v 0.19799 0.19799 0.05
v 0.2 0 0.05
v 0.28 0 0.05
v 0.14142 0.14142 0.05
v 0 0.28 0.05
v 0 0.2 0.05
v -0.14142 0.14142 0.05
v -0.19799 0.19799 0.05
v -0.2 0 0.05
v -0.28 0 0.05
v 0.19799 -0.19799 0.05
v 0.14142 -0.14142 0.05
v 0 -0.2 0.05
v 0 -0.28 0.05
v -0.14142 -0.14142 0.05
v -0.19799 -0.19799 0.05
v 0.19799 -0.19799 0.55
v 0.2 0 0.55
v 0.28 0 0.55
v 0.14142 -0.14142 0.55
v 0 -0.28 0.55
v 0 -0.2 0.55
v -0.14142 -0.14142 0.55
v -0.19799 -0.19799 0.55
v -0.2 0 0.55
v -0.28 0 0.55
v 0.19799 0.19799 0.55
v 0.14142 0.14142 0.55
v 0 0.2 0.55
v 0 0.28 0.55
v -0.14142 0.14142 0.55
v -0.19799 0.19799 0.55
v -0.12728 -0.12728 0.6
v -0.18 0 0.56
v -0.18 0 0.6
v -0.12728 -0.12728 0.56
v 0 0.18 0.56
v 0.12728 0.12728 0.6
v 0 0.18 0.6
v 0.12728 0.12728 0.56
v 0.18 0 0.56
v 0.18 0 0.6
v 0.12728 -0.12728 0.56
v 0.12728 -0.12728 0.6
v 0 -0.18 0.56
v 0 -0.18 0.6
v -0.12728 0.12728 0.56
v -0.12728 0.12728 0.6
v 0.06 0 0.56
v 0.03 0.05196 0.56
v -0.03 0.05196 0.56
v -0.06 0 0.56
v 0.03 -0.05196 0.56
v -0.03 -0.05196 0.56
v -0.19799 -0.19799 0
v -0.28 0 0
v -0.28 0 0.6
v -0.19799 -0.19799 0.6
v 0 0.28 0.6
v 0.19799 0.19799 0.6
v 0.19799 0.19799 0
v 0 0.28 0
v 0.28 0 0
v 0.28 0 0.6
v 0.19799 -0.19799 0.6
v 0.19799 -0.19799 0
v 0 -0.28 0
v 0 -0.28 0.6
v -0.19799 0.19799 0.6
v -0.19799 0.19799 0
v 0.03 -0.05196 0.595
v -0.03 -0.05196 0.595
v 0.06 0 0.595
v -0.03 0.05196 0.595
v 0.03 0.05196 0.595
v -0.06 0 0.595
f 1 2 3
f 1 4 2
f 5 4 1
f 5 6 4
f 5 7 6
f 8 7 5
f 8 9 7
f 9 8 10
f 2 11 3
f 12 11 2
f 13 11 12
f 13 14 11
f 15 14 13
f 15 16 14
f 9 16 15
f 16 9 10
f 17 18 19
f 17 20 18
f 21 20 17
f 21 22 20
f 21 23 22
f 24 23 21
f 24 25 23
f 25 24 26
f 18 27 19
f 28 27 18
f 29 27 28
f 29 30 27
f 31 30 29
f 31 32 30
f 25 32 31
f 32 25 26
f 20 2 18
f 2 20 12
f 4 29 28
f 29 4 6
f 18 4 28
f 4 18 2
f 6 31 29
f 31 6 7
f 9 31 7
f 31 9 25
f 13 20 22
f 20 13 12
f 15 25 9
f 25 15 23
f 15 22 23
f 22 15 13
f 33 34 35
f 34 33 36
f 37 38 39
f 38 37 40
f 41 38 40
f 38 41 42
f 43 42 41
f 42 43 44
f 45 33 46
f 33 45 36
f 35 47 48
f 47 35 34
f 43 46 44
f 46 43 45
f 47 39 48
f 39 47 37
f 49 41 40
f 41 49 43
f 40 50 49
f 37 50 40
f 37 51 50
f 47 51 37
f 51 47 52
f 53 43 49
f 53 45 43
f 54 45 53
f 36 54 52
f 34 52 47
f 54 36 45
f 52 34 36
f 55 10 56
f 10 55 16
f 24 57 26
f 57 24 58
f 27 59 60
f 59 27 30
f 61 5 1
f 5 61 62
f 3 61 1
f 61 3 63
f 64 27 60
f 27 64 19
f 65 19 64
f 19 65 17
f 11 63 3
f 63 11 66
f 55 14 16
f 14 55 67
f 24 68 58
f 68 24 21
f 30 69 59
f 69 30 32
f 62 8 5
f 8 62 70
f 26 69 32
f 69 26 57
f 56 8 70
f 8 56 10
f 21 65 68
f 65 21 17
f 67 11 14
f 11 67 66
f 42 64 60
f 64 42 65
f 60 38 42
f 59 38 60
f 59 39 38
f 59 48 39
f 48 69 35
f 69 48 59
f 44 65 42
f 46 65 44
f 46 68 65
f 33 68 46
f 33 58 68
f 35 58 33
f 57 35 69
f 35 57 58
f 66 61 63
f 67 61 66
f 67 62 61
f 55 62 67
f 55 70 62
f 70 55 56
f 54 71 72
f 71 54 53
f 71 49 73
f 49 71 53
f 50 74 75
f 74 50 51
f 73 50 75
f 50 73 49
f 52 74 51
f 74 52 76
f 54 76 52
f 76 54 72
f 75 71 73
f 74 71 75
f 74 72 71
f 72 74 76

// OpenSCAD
use <lib.scad>

module cutout() {
	difference() {
		cyl(0.29,0.29,0.5);
		cyl(0.20,0.20,0.6);
	}
	translate([0,0,0.31]) cyl(0.18,0.18,0.1);
}

module frame() {
	union() {
		difference() {
			cyl(0.28,0.28,0.6);
			cutout();
		}
		translate([0,0,0.27]) bolt();
	}
}

module mesh() {
	difference() {
		cyl(0.26,0.26,0.49);
		cyl(0.25,0.25,0.6);
		for (i = [-2:1:2])
			for (j = [0:30:150])
				translate([0,0,0.1*i]) rotate([0,0,j+(i*15)]) rotate([0,90,0]) cyl(0.06,0.06,1.0,$fn=6);
	}
}

module bolt() {
	cyl(0.06,0.06,0.05,$fn=6);
}

module filter() {
	cyl(0.24,0.24,0.5);
}

module frameLD($fn=8) {
	frame();
}

module frameHD($fn=24) {
	frame();
}

module meshHD($fn=24) {
	mesh();
}

module filterHD($fn=24) {
	filter();
}

module filterLD($fn=8) {
	filter();
}

module all() {
	translate([0,0,0.25])
	frameHD();
	translate([0,0,0.25])
	meshHD();
	translate([0,0,0.25])
	filterLD();
}

//all();

translate([0,0,0.3])
//frameHD();
frameLD();
//meshHD();
//filterHD();
//filterLD();
